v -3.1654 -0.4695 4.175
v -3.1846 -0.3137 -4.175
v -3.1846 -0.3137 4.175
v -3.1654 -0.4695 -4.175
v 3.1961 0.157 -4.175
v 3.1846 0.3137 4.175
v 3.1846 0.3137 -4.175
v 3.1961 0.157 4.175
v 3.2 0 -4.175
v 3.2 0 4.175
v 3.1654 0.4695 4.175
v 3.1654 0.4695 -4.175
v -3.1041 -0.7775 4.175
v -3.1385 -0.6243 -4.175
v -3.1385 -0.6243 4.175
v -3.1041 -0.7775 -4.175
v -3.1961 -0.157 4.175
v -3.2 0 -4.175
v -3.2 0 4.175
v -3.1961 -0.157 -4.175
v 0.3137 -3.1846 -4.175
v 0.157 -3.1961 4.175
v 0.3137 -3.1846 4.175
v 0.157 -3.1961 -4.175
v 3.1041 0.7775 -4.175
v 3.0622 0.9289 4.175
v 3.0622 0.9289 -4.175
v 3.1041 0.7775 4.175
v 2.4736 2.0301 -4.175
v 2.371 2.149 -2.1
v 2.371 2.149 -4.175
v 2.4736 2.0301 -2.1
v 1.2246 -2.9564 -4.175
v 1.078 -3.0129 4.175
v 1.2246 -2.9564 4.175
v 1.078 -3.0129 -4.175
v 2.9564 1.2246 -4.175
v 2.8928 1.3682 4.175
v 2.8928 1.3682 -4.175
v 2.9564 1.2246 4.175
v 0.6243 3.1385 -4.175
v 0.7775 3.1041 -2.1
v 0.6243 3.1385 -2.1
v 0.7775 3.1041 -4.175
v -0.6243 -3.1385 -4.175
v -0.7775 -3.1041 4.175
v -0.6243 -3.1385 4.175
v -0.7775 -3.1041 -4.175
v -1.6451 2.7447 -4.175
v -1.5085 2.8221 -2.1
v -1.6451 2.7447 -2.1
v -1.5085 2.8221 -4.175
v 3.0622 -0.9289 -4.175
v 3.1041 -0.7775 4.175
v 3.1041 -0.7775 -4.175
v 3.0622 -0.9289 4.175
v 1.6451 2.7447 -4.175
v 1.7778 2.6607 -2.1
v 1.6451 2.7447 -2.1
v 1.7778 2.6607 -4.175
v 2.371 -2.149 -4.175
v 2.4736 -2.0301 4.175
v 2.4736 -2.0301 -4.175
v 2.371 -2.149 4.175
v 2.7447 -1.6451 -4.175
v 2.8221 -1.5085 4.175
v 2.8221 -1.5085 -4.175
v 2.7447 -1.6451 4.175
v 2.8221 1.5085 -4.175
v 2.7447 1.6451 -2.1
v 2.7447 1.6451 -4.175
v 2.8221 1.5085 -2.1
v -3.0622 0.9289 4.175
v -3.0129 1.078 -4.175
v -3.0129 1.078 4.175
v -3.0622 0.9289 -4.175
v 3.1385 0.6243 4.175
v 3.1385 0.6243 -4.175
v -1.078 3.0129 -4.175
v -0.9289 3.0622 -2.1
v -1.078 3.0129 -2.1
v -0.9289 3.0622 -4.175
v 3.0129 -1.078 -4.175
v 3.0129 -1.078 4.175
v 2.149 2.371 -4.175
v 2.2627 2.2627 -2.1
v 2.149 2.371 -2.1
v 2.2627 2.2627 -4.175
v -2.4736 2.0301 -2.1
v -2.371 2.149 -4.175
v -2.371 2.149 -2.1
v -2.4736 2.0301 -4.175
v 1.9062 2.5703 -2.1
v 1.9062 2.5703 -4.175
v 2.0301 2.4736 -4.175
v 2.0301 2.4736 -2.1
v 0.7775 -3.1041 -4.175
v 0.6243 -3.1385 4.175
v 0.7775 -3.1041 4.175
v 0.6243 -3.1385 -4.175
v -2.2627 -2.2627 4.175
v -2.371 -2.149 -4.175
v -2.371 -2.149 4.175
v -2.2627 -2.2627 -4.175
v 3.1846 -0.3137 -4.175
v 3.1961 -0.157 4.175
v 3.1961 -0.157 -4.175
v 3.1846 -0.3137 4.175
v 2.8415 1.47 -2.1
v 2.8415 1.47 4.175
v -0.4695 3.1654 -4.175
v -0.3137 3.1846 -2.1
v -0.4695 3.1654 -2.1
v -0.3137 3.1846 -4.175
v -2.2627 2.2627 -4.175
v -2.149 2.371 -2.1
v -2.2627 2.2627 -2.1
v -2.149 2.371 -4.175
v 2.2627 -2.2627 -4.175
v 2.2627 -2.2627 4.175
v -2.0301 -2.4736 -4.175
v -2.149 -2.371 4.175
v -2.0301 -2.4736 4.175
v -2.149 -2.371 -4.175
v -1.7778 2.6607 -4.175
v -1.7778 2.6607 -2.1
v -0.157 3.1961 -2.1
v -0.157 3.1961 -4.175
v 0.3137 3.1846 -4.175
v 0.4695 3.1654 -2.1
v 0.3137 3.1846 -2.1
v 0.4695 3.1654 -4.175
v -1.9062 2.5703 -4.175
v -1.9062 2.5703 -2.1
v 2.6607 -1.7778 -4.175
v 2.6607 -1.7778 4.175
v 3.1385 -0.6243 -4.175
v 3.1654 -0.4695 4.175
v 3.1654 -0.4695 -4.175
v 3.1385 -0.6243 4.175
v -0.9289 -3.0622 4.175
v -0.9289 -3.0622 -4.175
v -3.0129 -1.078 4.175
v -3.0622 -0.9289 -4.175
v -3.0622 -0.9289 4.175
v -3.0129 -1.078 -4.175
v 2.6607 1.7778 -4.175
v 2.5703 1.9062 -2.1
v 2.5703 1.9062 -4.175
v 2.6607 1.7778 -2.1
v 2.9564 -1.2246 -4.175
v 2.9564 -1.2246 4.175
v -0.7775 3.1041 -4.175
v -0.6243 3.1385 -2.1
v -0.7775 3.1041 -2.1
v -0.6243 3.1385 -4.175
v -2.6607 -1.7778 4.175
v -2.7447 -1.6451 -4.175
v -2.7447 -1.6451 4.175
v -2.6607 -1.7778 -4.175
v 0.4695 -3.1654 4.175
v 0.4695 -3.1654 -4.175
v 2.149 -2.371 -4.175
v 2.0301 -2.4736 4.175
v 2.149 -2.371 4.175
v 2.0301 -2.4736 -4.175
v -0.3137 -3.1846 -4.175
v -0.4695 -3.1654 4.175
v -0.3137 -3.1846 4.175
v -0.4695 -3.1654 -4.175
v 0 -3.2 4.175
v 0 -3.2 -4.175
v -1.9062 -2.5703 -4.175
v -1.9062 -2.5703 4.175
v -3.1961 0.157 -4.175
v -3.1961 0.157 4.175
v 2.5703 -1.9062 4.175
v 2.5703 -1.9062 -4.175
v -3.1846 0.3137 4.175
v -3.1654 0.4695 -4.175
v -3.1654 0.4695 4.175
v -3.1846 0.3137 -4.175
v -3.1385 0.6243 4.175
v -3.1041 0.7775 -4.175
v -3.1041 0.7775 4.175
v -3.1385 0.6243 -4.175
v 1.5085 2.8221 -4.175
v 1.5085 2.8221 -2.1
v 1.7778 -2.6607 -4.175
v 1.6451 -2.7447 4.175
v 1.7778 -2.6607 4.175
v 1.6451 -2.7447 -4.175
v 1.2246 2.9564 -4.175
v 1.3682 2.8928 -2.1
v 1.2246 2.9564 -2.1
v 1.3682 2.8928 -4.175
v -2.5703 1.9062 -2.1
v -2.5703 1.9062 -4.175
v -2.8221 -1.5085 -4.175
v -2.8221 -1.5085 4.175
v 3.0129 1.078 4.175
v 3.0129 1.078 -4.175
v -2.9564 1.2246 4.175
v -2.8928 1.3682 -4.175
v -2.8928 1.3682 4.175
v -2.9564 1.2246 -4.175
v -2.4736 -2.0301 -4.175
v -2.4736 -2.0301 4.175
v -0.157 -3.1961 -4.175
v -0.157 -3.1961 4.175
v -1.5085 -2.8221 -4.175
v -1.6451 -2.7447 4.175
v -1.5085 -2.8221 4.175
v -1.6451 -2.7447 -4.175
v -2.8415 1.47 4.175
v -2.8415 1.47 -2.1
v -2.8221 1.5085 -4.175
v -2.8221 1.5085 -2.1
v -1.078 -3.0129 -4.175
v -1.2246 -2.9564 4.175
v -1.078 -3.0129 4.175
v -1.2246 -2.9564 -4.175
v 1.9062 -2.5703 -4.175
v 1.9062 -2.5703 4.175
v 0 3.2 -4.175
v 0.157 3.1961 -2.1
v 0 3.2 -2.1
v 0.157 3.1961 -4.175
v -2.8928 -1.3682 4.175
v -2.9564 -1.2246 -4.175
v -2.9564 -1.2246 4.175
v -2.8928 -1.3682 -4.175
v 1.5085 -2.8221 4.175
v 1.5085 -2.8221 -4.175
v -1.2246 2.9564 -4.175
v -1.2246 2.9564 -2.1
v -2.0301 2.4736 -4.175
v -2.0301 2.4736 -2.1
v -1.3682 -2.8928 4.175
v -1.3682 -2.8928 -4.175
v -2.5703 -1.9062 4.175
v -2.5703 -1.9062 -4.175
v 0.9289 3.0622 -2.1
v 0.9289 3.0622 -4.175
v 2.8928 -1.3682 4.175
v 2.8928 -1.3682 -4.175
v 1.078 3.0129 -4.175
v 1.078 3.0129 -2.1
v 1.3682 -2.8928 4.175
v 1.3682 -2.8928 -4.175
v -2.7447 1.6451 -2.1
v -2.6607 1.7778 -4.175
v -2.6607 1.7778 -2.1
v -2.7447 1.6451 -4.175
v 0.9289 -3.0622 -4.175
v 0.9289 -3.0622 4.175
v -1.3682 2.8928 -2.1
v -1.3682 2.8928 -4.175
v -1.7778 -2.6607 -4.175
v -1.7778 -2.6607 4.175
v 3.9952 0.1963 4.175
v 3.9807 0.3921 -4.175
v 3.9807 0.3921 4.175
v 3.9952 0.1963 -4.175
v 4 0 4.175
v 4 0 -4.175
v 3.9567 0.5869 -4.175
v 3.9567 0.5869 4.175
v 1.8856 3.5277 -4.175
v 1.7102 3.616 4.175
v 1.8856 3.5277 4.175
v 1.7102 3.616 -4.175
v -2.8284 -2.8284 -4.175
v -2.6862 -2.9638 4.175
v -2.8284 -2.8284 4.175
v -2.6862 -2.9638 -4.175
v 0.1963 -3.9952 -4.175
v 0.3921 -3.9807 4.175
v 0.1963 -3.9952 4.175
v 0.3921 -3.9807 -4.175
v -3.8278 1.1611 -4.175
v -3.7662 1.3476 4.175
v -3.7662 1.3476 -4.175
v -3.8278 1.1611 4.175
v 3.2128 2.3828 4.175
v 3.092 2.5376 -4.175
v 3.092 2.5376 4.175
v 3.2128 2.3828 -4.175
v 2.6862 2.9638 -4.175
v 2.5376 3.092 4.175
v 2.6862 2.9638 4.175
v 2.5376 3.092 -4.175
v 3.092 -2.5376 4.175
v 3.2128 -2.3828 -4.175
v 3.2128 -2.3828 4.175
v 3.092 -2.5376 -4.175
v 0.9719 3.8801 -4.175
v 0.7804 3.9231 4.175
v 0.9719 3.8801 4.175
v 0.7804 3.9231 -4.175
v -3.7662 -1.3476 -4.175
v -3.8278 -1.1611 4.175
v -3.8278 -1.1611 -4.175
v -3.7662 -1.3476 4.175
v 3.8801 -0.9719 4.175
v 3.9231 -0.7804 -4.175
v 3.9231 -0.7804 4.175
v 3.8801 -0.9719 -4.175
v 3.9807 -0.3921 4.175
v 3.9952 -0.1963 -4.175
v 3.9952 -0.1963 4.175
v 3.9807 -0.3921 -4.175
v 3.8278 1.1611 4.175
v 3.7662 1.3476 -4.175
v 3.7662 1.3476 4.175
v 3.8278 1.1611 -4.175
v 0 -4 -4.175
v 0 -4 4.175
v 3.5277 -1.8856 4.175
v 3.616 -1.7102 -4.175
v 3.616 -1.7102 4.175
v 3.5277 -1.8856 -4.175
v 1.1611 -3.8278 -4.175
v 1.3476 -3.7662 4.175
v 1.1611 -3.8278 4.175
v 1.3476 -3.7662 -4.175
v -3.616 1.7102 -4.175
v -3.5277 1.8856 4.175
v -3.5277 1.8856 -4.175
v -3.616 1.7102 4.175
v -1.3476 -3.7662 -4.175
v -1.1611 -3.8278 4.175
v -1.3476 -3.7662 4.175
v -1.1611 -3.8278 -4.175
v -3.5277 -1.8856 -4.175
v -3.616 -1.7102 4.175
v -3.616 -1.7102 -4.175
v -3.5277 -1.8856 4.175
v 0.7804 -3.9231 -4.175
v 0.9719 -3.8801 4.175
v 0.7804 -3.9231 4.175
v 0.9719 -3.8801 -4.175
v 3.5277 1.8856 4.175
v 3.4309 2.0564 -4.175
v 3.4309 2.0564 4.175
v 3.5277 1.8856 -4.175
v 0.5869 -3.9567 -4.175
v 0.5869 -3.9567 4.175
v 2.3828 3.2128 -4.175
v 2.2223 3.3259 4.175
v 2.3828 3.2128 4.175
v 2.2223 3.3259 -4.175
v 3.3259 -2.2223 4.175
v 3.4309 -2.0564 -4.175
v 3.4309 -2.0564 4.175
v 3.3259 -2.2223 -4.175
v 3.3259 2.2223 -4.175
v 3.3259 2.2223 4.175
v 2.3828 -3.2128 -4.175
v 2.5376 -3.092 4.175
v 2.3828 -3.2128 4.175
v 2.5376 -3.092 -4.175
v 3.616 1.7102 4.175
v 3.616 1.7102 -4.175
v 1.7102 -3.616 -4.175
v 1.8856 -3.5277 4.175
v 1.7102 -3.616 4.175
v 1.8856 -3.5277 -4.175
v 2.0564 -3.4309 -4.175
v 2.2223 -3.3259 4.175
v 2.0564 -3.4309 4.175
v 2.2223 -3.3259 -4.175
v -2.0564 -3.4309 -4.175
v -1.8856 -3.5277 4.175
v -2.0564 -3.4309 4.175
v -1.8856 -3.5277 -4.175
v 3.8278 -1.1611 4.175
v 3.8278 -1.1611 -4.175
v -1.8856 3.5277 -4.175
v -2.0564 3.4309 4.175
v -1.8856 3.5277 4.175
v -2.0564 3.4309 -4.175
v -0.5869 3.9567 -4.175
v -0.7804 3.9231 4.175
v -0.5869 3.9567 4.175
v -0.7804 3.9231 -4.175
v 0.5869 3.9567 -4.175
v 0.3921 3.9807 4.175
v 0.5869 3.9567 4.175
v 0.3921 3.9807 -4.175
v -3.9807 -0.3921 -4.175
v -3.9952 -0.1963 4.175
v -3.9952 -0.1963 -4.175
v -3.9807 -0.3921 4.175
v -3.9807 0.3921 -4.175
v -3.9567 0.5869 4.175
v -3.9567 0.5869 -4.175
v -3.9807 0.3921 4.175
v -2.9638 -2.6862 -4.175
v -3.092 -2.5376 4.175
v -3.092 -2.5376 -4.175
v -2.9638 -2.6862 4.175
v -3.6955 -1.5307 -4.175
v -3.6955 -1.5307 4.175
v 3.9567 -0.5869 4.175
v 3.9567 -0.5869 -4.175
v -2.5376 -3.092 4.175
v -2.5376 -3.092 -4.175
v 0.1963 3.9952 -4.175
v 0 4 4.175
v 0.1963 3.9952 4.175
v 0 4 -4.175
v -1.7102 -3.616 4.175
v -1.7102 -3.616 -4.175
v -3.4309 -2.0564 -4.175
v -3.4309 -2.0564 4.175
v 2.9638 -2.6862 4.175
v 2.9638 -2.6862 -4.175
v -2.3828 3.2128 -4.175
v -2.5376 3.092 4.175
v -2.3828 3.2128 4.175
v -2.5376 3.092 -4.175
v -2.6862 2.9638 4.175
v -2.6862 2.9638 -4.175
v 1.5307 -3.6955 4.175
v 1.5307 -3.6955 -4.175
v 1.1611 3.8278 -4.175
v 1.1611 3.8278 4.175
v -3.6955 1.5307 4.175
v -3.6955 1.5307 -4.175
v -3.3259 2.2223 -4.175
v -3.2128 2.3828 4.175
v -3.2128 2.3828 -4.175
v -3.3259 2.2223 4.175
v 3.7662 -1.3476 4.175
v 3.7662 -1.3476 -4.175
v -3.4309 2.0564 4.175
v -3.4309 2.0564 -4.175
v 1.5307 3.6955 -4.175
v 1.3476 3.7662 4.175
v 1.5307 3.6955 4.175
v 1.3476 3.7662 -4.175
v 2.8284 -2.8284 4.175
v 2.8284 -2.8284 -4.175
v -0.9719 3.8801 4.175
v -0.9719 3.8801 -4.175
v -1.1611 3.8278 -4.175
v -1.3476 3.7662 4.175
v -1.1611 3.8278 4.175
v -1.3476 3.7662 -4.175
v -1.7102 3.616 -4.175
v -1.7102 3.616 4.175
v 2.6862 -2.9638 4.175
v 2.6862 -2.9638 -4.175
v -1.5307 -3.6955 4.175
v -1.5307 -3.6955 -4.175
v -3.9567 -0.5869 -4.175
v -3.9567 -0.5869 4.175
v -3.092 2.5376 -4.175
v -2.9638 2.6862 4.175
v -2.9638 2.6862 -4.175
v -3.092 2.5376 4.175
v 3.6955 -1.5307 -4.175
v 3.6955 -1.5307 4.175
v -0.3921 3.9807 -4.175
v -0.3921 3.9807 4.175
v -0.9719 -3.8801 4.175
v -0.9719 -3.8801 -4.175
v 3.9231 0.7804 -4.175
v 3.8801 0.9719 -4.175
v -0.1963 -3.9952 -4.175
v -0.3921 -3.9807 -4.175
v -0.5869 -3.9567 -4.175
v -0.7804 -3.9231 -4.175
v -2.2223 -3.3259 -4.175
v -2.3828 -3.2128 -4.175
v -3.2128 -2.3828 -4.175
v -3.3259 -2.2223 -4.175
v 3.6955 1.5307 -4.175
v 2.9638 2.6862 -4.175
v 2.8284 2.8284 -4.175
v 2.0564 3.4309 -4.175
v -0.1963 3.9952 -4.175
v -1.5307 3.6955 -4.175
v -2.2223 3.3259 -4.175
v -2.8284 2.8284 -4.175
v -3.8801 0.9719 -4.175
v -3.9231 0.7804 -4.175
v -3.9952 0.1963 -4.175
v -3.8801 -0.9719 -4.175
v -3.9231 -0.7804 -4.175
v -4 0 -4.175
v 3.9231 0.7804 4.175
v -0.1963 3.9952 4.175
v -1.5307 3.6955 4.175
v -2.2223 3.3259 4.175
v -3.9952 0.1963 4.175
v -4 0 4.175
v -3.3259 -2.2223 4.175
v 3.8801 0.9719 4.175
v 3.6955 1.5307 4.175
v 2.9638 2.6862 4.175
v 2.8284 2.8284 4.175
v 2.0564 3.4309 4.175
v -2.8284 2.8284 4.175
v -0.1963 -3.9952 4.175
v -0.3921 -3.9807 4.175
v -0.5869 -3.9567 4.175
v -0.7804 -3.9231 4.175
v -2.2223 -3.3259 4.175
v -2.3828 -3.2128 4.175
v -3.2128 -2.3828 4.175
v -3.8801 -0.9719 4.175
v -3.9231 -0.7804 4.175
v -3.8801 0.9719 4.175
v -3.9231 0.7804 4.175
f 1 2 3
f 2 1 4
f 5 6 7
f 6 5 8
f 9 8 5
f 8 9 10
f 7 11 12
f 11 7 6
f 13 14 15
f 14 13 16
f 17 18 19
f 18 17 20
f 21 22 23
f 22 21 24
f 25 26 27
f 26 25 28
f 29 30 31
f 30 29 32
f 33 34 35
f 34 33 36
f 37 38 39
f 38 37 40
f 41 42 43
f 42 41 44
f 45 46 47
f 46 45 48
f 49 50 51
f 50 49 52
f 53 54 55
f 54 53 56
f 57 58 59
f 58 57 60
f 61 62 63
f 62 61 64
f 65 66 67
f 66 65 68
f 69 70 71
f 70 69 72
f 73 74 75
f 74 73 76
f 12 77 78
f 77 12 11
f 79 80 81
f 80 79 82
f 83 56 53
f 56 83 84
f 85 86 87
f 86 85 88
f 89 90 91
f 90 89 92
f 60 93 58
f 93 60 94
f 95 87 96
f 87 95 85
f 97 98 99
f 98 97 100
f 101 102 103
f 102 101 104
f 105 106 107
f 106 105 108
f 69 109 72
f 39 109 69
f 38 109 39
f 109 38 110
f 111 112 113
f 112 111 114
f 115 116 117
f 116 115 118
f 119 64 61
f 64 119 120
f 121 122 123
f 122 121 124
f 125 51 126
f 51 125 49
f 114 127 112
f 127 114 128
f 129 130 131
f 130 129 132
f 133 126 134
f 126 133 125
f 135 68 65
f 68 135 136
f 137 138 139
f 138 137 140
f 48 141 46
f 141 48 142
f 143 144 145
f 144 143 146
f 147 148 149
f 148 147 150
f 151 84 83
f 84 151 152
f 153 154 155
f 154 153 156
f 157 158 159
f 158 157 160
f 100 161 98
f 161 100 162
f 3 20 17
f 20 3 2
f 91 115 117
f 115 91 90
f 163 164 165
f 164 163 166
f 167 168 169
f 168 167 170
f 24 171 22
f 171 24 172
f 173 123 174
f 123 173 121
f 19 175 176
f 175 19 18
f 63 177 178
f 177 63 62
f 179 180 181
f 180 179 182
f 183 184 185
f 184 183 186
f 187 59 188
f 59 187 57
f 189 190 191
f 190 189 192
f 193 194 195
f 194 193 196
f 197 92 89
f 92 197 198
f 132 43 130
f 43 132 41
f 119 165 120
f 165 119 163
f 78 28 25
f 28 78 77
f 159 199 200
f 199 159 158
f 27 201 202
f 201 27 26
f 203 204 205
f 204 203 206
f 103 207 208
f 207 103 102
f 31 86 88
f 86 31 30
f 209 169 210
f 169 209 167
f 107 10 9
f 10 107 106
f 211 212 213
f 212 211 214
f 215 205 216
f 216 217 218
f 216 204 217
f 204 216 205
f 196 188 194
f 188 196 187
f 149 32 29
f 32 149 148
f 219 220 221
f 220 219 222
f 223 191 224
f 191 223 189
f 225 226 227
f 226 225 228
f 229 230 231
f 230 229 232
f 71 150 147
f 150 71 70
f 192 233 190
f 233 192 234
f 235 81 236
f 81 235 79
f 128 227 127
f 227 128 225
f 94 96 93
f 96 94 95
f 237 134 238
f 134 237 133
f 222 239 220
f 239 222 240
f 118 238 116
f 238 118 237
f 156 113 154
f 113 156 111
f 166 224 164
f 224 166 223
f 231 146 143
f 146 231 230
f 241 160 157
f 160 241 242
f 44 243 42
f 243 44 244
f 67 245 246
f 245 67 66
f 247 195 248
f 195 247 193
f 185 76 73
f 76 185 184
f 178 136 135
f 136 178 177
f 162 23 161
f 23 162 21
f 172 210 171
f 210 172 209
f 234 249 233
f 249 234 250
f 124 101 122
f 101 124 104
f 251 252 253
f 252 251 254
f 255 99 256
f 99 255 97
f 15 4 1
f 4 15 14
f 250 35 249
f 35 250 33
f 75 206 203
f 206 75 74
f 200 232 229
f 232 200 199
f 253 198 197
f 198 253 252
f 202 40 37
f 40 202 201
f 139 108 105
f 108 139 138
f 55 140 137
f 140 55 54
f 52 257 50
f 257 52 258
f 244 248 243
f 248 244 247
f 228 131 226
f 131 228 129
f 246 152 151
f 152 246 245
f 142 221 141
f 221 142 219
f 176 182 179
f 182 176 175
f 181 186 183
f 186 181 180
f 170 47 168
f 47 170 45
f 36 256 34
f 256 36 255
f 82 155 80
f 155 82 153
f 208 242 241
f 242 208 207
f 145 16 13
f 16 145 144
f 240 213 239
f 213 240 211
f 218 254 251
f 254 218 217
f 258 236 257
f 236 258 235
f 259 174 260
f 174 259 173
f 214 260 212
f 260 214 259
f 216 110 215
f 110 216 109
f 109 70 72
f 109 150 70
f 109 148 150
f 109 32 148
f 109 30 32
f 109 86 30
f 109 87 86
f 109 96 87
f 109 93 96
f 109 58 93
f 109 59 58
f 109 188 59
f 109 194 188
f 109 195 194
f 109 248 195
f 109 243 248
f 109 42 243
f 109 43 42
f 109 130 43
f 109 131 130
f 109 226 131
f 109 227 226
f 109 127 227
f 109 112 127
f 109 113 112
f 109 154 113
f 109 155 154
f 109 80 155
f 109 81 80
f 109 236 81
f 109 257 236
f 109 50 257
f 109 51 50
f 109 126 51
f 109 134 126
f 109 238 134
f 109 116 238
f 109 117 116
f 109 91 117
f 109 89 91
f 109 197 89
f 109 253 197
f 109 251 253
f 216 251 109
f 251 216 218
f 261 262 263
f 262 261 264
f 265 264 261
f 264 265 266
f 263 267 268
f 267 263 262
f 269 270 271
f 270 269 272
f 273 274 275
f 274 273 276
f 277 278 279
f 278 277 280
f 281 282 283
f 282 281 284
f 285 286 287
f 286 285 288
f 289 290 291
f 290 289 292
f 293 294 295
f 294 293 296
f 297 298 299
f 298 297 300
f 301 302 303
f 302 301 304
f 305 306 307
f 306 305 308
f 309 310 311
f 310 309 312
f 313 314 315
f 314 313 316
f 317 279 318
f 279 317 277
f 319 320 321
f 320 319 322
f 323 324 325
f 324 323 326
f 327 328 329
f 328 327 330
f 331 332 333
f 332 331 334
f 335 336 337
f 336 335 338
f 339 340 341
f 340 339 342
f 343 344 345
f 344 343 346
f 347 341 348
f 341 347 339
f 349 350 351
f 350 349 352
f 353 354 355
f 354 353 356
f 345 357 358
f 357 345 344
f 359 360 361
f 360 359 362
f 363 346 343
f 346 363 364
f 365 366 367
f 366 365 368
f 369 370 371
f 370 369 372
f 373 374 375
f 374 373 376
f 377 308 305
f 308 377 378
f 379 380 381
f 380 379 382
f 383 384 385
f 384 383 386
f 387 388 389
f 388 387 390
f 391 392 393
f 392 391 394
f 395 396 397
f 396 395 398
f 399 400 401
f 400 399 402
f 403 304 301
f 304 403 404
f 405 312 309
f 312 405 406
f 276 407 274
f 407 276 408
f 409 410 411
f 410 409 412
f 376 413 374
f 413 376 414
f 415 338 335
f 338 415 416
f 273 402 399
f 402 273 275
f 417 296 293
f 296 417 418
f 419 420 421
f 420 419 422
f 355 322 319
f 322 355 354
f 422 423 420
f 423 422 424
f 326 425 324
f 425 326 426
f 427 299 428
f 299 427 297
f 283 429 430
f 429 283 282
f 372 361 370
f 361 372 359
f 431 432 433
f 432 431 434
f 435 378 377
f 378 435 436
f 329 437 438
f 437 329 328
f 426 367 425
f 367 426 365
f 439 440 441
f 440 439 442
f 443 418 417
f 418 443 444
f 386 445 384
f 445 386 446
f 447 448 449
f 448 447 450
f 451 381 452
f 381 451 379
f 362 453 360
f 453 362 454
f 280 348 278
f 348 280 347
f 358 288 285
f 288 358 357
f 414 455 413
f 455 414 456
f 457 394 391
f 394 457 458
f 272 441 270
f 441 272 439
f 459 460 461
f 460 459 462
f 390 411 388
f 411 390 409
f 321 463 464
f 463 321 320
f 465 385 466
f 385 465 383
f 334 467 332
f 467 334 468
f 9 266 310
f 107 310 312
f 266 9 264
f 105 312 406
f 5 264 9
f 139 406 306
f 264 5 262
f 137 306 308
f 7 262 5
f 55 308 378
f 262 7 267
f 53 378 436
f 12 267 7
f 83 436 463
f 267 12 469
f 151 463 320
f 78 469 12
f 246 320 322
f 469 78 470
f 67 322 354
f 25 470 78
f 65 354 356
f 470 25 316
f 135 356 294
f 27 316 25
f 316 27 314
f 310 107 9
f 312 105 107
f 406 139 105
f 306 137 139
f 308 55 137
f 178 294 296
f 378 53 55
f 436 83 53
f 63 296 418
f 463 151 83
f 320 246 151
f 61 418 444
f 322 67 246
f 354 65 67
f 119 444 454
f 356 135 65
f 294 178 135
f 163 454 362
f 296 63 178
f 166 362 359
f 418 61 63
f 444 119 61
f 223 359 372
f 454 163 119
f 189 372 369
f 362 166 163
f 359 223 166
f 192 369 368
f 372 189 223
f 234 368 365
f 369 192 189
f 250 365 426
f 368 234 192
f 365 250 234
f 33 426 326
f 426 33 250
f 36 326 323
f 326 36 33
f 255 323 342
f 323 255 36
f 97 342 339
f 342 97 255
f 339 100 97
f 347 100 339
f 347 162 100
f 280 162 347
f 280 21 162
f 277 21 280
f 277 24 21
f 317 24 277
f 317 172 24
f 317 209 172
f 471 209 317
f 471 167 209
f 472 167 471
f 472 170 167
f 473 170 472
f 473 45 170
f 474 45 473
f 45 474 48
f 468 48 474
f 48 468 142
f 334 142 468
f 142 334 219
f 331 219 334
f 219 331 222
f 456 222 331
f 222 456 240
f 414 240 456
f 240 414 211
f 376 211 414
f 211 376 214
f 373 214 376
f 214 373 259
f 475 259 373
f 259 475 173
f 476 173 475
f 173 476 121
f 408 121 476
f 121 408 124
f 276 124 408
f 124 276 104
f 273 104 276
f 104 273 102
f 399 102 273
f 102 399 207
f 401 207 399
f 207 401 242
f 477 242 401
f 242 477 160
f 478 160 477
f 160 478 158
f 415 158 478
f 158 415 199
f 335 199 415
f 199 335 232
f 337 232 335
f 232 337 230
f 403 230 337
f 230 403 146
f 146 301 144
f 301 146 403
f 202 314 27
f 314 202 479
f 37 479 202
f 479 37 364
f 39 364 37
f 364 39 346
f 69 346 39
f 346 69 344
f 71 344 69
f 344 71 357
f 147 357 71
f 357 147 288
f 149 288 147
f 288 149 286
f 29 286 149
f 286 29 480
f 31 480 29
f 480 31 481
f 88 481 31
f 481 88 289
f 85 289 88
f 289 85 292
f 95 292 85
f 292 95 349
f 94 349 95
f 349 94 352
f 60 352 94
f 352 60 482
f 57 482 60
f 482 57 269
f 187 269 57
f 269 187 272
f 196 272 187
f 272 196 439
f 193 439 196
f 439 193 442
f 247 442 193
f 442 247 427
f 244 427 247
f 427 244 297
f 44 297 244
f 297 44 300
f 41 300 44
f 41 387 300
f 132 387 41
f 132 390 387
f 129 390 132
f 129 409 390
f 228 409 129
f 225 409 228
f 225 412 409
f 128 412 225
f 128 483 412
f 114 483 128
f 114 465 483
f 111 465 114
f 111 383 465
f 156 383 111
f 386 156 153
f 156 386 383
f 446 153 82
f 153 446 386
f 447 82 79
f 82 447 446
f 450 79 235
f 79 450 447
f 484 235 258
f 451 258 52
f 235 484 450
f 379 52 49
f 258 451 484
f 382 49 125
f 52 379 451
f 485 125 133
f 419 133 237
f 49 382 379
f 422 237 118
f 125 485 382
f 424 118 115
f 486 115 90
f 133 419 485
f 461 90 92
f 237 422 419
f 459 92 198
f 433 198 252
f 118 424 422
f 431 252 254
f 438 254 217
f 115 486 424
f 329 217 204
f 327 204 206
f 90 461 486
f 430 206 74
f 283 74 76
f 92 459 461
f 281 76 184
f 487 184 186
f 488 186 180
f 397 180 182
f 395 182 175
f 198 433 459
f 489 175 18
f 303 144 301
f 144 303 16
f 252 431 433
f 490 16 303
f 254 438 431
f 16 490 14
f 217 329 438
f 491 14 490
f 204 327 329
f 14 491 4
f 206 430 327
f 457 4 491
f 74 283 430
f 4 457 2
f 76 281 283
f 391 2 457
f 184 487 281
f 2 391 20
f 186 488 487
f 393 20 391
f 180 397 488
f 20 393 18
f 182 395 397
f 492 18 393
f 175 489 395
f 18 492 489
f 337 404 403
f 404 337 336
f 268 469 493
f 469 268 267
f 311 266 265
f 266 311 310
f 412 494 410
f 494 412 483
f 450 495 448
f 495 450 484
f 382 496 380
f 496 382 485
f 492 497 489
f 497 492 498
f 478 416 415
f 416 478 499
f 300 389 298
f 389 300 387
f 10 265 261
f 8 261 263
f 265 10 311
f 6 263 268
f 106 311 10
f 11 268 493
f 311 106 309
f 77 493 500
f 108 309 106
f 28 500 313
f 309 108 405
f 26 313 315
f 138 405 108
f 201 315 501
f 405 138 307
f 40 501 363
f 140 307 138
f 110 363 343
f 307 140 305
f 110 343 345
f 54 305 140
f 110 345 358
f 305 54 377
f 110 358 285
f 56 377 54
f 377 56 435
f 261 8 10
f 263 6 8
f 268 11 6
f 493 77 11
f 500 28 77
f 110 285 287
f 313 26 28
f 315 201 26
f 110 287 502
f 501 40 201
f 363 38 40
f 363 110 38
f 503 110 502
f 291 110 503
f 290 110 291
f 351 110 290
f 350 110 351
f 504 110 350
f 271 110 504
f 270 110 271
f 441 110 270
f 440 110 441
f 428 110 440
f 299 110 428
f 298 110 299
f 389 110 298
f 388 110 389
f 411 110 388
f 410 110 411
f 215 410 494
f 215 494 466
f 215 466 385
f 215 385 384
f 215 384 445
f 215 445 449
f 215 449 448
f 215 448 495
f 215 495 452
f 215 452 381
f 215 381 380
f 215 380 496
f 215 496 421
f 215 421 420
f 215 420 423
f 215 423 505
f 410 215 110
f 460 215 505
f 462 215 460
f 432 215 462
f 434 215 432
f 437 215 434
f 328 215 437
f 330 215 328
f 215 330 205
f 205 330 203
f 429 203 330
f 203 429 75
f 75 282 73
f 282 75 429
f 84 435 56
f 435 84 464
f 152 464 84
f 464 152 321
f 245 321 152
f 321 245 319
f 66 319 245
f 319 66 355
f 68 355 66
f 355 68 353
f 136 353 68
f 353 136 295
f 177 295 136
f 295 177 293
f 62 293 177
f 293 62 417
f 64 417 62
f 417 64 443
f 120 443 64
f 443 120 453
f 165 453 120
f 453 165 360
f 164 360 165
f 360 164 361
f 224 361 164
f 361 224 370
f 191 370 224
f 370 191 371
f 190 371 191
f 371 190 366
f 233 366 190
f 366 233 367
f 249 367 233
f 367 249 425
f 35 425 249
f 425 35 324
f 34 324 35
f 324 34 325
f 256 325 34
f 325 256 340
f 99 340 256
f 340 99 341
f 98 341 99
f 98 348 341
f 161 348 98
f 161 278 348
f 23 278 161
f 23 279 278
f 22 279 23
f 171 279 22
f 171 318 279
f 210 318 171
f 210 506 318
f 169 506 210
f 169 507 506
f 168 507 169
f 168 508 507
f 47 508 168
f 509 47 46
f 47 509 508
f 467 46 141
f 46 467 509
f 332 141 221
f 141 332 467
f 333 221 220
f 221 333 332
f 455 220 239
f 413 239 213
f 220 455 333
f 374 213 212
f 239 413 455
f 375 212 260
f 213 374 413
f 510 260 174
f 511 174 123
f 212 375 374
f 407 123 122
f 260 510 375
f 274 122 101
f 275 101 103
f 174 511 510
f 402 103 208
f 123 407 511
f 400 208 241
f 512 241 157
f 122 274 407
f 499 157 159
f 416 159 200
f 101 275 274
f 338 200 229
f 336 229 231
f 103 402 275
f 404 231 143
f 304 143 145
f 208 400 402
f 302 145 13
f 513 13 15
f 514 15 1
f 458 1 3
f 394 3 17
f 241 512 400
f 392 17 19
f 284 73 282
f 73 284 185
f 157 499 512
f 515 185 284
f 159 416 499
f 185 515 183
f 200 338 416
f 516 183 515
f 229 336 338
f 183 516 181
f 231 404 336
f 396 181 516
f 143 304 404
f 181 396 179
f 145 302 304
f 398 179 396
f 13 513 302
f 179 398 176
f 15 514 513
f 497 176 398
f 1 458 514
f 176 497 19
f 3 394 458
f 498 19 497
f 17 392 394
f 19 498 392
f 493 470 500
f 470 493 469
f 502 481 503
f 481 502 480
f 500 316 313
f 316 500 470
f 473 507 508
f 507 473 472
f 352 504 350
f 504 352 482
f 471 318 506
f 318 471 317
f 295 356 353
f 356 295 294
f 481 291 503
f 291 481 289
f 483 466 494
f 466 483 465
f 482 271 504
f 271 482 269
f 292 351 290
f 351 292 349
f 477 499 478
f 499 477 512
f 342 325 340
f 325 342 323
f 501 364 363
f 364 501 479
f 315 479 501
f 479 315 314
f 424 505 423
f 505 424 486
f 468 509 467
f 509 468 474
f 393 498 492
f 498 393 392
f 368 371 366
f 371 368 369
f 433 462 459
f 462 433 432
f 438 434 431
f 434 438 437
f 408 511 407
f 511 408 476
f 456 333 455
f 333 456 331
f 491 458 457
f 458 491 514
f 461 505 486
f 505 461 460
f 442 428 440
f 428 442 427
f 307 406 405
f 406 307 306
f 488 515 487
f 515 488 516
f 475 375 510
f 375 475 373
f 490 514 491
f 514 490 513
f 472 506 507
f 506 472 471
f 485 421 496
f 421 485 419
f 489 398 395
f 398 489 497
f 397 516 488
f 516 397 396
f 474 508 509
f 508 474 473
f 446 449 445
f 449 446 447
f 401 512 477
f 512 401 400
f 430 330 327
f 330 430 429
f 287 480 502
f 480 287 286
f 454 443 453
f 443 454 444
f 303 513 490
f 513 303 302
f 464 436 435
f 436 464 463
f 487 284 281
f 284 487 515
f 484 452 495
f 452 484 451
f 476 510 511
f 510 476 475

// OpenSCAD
module cylinderOutside(heights, diameter)
{
   cylinder(heights,d = diameter, center = true, $fn=128); 
}

module plate(l, b)
{
    translate([0,4.47,1.04])
    rotate([90,0,0])
    {
    cube([l, b , 6], center = true);
    }
}

module insideCube(heights, diameter, length, width)
{
    difference()
    {
        cylinderOutside(heights, diameter);
        plate(length, width);
    }
    
}

module cylinderSchachtel(heights, diameter)
{
    cylinder(heights, d = diameter, center = true, $fn=128); 
}


module ky_040_Rotery_Encoder_Head(heights, diameter, length, width, l, b)
{
    difference()
    {
        cylinderSchachtel(l, b);
        insideCube(heights, diameter, length, width);
    }
}

ky_040_Rotery_Encoder_Head(8.36, 6.4, 10, 6.28, 8.35, 8);
